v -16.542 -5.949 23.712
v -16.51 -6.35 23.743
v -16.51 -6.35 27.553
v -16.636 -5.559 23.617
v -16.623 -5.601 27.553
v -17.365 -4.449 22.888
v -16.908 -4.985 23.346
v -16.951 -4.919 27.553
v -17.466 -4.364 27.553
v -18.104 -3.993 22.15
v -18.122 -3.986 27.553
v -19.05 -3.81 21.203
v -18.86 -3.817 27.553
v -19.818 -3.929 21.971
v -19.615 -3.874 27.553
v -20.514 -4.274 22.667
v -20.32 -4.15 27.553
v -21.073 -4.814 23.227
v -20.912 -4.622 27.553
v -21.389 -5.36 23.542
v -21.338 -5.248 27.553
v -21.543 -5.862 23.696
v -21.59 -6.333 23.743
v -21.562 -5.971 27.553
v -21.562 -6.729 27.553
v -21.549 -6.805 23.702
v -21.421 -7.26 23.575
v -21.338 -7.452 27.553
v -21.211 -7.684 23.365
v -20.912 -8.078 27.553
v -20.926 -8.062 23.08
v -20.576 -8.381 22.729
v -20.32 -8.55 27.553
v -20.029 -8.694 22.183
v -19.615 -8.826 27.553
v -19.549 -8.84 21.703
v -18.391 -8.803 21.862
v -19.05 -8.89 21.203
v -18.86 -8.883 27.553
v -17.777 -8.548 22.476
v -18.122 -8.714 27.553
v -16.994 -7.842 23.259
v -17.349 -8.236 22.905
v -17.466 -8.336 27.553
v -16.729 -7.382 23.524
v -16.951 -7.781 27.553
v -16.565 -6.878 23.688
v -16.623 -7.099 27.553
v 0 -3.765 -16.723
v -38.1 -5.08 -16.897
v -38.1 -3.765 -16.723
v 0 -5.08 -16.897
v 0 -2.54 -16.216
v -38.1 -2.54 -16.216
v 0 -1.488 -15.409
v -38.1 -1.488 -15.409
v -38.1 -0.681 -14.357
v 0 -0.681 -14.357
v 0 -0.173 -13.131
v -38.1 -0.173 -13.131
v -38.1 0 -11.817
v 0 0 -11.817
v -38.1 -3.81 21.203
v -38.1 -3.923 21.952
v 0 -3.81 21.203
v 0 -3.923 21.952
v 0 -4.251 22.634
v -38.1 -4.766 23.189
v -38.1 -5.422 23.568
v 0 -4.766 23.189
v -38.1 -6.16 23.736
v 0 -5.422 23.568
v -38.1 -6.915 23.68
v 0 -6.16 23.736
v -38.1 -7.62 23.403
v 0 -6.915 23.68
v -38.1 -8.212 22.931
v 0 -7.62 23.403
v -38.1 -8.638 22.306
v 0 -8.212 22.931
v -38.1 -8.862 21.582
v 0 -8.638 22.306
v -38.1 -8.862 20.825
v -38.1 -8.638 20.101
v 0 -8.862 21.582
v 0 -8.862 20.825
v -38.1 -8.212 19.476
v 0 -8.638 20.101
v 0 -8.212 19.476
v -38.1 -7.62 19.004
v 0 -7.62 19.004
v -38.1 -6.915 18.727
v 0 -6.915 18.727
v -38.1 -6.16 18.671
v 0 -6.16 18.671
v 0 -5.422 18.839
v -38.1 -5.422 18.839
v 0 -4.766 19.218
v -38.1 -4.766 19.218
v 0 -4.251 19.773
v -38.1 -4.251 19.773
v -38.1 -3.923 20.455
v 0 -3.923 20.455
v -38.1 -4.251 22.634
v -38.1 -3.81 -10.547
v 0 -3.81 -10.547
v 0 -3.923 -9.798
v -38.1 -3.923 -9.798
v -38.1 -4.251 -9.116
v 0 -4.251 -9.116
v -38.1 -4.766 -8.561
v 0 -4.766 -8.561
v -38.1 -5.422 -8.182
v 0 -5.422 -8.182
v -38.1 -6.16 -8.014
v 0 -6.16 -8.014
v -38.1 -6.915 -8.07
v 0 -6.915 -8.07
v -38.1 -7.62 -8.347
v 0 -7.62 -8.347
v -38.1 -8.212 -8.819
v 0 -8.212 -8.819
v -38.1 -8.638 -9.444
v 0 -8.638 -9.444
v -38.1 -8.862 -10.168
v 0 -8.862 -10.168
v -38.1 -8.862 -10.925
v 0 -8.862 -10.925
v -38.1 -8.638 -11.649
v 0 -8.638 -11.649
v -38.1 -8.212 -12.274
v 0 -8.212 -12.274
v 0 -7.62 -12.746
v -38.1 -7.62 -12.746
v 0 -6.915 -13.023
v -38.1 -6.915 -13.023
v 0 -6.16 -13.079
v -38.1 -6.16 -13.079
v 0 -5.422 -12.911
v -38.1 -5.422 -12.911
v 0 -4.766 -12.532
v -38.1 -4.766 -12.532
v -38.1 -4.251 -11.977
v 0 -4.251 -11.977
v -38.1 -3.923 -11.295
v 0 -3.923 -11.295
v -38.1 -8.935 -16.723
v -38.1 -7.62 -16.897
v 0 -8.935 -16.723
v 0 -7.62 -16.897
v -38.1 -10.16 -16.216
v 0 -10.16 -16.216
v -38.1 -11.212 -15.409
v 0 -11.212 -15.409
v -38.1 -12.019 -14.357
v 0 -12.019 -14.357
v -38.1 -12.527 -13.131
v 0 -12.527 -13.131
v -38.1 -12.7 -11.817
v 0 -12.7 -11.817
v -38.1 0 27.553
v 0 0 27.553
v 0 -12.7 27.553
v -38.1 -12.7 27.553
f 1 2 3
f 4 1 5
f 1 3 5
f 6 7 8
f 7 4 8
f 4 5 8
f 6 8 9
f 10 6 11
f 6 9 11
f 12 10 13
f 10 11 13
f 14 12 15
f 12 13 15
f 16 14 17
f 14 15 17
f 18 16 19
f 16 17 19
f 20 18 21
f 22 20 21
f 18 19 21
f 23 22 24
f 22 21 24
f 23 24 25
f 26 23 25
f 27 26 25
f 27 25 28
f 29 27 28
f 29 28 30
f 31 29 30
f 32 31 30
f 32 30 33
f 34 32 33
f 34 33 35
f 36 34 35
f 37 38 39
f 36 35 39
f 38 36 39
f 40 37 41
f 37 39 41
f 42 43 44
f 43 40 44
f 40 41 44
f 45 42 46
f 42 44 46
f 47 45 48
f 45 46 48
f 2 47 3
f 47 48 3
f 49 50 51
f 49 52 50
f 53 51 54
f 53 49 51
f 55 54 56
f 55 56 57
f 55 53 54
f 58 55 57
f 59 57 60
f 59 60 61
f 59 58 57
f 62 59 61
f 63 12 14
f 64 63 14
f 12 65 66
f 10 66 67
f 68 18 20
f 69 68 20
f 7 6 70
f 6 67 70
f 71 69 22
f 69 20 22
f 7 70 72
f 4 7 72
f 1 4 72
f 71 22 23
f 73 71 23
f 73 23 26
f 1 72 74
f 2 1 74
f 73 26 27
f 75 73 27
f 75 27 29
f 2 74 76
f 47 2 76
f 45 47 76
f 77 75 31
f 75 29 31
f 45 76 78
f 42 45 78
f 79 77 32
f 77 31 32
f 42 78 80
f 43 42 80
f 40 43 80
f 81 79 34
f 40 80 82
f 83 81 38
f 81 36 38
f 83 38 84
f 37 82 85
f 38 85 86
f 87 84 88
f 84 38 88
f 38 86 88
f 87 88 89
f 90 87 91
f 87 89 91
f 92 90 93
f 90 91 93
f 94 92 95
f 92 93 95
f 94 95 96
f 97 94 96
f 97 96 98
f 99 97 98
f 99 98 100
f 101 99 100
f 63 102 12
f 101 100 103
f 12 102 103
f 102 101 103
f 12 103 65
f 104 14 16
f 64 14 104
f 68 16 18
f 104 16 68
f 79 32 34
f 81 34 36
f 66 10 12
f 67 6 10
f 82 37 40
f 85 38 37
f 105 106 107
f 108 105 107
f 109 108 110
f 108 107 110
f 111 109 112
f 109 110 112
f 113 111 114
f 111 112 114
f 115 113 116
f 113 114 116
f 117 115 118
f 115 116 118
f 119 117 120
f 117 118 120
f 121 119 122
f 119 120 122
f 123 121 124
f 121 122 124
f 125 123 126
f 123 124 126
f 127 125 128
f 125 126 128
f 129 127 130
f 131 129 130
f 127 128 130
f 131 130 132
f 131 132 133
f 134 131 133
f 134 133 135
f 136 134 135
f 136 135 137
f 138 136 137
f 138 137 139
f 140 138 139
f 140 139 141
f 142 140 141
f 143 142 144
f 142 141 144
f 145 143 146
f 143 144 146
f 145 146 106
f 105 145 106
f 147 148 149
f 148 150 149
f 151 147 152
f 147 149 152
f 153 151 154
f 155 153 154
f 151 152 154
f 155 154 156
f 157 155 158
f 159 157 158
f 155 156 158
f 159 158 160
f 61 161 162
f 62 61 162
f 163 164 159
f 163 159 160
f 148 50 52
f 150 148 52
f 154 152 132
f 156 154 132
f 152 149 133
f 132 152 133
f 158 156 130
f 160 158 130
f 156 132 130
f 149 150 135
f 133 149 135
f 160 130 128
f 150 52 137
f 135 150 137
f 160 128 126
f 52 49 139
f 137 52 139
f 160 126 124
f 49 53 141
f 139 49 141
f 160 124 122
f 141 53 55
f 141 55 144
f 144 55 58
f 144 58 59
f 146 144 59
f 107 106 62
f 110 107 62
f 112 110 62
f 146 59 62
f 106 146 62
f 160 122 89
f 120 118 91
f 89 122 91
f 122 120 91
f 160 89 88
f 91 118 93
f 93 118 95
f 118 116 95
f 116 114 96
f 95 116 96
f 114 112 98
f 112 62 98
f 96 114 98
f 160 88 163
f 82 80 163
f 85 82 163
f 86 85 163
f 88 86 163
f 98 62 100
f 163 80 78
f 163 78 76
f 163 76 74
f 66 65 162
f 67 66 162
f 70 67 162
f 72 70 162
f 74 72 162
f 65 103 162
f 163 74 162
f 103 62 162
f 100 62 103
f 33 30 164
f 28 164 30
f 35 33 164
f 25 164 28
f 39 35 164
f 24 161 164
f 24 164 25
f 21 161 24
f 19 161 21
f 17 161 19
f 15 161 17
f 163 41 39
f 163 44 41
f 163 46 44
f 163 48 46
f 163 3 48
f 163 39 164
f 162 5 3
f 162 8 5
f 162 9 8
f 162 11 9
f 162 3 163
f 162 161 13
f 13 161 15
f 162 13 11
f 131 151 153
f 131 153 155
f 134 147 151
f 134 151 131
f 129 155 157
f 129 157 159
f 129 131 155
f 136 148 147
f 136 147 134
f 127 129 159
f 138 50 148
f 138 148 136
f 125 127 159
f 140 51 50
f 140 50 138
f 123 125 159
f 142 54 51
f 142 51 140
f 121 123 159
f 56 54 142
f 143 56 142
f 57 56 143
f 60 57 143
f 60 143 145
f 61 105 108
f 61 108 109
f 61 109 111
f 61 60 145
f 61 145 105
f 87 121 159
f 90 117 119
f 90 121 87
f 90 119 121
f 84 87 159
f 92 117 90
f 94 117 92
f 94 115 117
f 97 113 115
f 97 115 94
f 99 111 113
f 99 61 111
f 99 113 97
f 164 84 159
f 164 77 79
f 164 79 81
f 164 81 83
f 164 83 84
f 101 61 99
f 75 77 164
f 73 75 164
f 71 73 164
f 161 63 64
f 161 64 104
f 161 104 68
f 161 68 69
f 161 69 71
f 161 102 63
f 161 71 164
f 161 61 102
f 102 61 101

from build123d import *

# Parameters (mm, degrees)
F0_W     = 38.1
F0_H     = 44.45
F1_DEPTH = 12.7
F2_R     = 5.08
F3_R     = 2.54
F4_DEPTH = 38.1
F5_R     = 2.54
F6_DEPTH = 6.35


with BuildPart() as f1:
    # F0 (on Front) → F1 (new body)
    with BuildSketch(Plane.XZ):
        with Locations((-19.05, 5.328478)):
            Rectangle(F0_W, F0_H)
    extrude(amount=F1_DEPTH)

    # F2
    f2_edges = [f1.edges().sort_by_distance(p)[0] for p in [
        (-19.05, 0, -16.896522),
        (-19.05, -12.7, -16.896522),
    ]]
    fillet(f2_edges, radius=F2_R)

    # F3 (on face) → F4 (cut)
    with BuildSketch(Plane.YZ):
        with Locations((-6.35, -10.546522)):
            Circle(F3_R)
        with Locations((-6.35, 21.203478)):
            Circle(F3_R)
    extrude(amount=-F4_DEPTH, mode=Mode.SUBTRACT)

    # F5 (on face) → F6 (cut)
    with BuildSketch(Plane.XY.offset(27.553478)):
        with Locations((-19.05, -6.35)):
            Circle(F5_R)
    extrude(amount=-F6_DEPTH, mode=Mode.SUBTRACT)


solid = f1.part
